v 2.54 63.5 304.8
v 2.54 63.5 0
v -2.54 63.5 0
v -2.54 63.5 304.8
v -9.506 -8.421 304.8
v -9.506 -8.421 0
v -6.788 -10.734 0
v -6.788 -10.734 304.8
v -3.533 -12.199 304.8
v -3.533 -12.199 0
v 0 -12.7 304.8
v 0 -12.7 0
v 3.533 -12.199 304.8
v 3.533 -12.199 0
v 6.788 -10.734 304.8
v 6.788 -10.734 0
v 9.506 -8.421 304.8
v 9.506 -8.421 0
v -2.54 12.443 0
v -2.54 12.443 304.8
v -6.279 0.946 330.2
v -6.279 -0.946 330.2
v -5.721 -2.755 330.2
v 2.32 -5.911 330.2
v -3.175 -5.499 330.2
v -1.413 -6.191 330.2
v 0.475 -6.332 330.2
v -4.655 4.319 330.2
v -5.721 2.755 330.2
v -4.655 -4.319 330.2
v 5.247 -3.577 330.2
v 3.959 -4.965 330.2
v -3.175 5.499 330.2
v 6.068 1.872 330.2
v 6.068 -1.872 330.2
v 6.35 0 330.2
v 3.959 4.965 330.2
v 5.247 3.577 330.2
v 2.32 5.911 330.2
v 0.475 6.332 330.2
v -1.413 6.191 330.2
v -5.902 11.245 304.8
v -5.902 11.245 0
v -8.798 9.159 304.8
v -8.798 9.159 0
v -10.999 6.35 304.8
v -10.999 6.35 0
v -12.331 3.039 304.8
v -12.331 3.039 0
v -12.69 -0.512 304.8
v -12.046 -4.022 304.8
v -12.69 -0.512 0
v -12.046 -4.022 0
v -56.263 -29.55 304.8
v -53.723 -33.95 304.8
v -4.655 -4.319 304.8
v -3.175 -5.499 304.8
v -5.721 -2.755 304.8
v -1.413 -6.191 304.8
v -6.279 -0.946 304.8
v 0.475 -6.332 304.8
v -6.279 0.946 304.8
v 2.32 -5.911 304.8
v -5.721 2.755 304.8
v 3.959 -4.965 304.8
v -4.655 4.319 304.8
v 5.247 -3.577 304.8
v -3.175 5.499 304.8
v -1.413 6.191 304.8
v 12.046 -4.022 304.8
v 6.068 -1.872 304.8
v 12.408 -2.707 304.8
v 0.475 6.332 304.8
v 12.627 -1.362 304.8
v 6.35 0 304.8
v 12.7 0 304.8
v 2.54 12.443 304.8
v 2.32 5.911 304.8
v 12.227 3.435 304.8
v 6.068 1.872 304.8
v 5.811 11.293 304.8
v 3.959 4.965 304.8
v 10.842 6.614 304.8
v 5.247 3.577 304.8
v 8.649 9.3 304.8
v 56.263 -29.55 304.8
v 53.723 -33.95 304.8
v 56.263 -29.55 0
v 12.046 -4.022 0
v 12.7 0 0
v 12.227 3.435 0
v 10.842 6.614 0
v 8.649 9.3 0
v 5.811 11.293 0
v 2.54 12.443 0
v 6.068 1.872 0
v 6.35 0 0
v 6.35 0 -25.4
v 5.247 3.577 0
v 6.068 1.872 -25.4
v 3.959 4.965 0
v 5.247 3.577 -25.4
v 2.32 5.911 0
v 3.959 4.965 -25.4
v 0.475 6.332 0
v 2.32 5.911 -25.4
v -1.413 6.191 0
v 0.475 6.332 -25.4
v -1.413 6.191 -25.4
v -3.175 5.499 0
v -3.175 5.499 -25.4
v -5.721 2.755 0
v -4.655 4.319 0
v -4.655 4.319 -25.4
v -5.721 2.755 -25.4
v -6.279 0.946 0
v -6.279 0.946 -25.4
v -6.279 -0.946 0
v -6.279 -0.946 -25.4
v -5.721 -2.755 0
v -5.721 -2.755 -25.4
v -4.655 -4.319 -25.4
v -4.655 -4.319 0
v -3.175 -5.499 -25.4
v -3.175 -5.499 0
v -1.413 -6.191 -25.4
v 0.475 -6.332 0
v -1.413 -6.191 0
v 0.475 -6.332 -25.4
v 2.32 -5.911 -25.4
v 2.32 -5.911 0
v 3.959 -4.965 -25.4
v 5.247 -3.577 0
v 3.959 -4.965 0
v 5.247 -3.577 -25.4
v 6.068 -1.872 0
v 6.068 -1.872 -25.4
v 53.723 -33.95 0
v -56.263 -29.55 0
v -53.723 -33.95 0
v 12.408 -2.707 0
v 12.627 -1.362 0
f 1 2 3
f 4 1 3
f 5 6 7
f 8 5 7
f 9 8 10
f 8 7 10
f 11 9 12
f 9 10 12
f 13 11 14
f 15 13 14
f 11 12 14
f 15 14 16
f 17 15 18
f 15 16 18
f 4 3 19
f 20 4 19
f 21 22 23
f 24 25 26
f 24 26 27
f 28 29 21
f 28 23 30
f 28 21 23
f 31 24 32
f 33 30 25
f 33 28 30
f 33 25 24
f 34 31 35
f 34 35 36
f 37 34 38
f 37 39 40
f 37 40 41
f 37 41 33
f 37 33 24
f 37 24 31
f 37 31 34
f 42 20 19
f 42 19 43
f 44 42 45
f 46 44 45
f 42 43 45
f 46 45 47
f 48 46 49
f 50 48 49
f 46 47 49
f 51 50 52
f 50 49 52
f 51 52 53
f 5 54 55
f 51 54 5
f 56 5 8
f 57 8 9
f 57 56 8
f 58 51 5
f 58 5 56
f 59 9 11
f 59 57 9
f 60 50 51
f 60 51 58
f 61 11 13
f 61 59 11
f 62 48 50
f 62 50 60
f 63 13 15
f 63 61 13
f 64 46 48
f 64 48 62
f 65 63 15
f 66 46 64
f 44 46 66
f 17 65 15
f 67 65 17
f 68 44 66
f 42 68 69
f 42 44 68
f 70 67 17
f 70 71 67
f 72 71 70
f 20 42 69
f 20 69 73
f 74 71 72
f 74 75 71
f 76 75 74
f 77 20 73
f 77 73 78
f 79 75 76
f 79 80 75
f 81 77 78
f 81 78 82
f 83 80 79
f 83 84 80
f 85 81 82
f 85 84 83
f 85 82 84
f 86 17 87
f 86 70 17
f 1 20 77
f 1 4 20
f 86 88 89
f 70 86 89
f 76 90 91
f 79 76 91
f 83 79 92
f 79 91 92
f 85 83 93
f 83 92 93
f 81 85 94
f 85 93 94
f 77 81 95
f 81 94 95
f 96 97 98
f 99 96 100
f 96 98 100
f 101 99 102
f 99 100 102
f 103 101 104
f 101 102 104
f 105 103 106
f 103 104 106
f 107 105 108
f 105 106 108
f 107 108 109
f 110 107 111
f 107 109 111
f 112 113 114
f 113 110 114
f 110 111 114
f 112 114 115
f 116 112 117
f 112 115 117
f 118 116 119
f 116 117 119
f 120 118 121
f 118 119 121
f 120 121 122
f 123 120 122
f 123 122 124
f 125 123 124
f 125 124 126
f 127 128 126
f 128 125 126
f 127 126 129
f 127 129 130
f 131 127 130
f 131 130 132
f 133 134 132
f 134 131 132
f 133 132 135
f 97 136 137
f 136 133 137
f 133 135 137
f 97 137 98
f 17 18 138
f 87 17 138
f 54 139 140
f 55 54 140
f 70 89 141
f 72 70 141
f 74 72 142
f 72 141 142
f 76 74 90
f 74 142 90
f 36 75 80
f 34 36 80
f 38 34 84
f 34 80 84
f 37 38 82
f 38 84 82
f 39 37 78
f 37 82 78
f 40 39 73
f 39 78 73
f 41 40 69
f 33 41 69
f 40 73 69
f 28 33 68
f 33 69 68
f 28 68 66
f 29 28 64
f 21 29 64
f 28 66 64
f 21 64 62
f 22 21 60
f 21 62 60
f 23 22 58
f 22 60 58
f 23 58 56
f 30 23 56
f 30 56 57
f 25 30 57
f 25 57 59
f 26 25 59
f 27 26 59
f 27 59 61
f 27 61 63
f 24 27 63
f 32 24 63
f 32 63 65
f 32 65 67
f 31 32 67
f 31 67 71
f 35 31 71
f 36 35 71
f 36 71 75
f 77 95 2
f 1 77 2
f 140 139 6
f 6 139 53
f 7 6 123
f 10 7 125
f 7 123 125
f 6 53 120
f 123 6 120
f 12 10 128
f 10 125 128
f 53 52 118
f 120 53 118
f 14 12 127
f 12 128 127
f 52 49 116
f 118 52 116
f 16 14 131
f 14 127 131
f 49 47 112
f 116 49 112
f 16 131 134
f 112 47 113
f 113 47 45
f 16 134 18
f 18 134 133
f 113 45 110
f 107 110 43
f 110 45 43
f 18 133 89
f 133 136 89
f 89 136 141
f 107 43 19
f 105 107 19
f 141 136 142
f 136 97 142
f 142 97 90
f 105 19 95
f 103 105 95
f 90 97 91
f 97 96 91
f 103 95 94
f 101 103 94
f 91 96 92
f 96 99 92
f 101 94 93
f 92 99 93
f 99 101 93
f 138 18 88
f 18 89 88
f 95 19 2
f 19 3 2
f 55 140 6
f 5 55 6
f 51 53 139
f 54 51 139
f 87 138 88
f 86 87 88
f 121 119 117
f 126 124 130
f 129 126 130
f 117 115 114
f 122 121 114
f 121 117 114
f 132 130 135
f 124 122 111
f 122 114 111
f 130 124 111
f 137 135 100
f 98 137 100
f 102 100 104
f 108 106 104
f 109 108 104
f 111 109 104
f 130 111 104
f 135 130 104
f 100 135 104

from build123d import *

# Parameters (mm, degrees)
BOSS_EXTRUDE1_DEPTH      = 304.8
BOSS_EXTRUDE2_DEPTH      = 25.4
BOSS_EXTRUDE2_DEPTH_BACK = 330.2
SKETCH2_R                = 6.35


with BuildPart() as part:
    # Sketch1 → Boss-Extrude1 (new body)
    with BuildSketch(Plane.XY):
        with BuildLine():
            Line((-2.54, 1.466469684), (-2.54, 12.443407893))
            ThreePointArc((-2.54, 12.443407893), (-10.998522628, 6.35), (-12.046307345, -4.021999421))
            Line((-12.046307345, -4.021999421), (-2.54, 1.466469684))
        make_face()
        with BuildLine():
            ThreePointArc((-9.506307345, -8.421408472), (0, -12.7), (9.506307345, -8.421408472))
            Line((9.506307345, -8.421408472), (0, -2.932939367))
            Line((0, -2.932939367), (-9.506307345, -8.421408472))
        make_face()
        with BuildLine():
            ThreePointArc((12.7, 0), (9.837377699, 8.032185257), (2.54, 12.443407893))
            Line((2.54, 12.443407893), (2.54, 1.466469684))
            Line((2.54, 1.466469684), (12.046307345, -4.021999421))
            ThreePointArc((12.046307345, -4.021999421), (12.535511623, -2.037387631), (12.7, 0))
        make_face()
        with BuildLine():
            Line((10.998522628, -6.35), (0, 0))
            Line((0, 0), (-10.998522628, -6.35))
            ThreePointArc((-10.998522628, -6.35), (-10.304595884, -7.423294665), (-9.506307345, -8.421408472))
            Line((-9.506307345, -8.421408472), (0, -2.932939367))
            Line((0, -2.932939367), (9.506307345, -8.421408472))
            ThreePointArc((9.506307345, -8.421408472), (10.304595884, -7.423294665), (10.998522628, -6.35))
        make_face()
        with BuildLine():
            Line((-10.998522628, -6.35), (0, 0))
            Line((0, 0), (0, 12.7))
            ThreePointArc((0, 12.7), (-1.276463817, 12.635689143), (-2.54, 12.443407893))
            Line((-2.54, 12.443407893), (-2.54, 1.466469684))
            Line((-2.54, 1.466469684), (-12.046307345, -4.021999421))
            ThreePointArc((-12.046307345, -4.021999421), (-11.581059701, -5.212394479), (-10.998522628, -6.35))
        make_face()
        with BuildLine():
            Line((0, 12.7), (0, 0))
            Line((0, 0), (10.998522628, -6.35))
            ThreePointArc((10.998522628, -6.35), (11.581059701, -5.212394479), (12.046307345, -4.021999421))
            Line((12.046307345, -4.021999421), (2.54, 1.466469684))
            Line((2.54, 1.466469684), (2.54, 12.443407893))
            ThreePointArc((2.54, 12.443407893), (1.276463817, 12.635689143), (0, 12.7))
        make_face()
        with BuildLine():
            Line((0, 63.5), (0, 12.7))
            ThreePointArc((0, 12.7), (1.276463817, 12.635689143), (2.54, 12.443407893))
            Line((2.54, 12.443407893), (2.54, 63.5))
            Line((2.54, 63.5), (0, 63.5))
        make_face()
        with BuildLine():
            ThreePointArc((-2.54, 12.443407893), (-1.276463817, 12.635689143), (0, 12.7))
            Line((0, 12.7), (0, 63.5))
            Line((0, 63.5), (-2.54, 63.5))
            Line((-2.54, 63.5), (-2.54, 12.443407893))
        make_face()
        with BuildLine():
            Line((-54.99261314, -31.75), (-10.998522628, -6.35))
            ThreePointArc((-10.998522628, -6.35), (-11.581059701, -5.212394479), (-12.046307345, -4.021999421))
            Line((-12.046307345, -4.021999421), (-56.26261314, -29.550295474))
            Line((-56.26261314, -29.550295474), (-54.99261314, -31.75))
        make_face()
        with BuildLine():
            ThreePointArc((-9.506307345, -8.421408472), (-10.304595884, -7.423294665), (-10.998522628, -6.35))
            Line((-10.998522628, -6.35), (-54.99261314, -31.75))
            Line((-54.99261314, -31.75), (-53.72261314, -33.949704526))
            Line((-53.72261314, -33.949704526), (-9.506307345, -8.421408472))
        make_face()
        with BuildLine():
            Line((54.99261314, -31.75), (10.998522628, -6.35))
            ThreePointArc((10.998522628, -6.35), (10.304595884, -7.423294665), (9.506307345, -8.421408472))
            Line((9.506307345, -8.421408472), (53.72261314, -33.949704526))
            Line((53.72261314, -33.949704526), (54.99261314, -31.75))
        make_face()
        with BuildLine():
            ThreePointArc((12.046307345, -4.021999421), (11.581059701, -5.212394479), (10.998522628, -6.35))
            Line((10.998522628, -6.35), (54.99261314, -31.75))
            Line((54.99261314, -31.75), (56.26261314, -29.550295474))
            Line((56.26261314, -29.550295474), (12.046307345, -4.021999421))
        make_face()
    extrude(amount=BOSS_EXTRUDE1_DEPTH)

    # Sketch2 → Boss-Extrude2 (add, two sides: drawn at the far end of the back side and taken through both)
    with BuildSketch(Plane.XY.offset(304.8).offset(-BOSS_EXTRUDE2_DEPTH_BACK)):
        Circle(SKETCH2_R)
    extrude(amount=BOSS_EXTRUDE2_DEPTH + BOSS_EXTRUDE2_DEPTH_BACK)


solid = part.part
